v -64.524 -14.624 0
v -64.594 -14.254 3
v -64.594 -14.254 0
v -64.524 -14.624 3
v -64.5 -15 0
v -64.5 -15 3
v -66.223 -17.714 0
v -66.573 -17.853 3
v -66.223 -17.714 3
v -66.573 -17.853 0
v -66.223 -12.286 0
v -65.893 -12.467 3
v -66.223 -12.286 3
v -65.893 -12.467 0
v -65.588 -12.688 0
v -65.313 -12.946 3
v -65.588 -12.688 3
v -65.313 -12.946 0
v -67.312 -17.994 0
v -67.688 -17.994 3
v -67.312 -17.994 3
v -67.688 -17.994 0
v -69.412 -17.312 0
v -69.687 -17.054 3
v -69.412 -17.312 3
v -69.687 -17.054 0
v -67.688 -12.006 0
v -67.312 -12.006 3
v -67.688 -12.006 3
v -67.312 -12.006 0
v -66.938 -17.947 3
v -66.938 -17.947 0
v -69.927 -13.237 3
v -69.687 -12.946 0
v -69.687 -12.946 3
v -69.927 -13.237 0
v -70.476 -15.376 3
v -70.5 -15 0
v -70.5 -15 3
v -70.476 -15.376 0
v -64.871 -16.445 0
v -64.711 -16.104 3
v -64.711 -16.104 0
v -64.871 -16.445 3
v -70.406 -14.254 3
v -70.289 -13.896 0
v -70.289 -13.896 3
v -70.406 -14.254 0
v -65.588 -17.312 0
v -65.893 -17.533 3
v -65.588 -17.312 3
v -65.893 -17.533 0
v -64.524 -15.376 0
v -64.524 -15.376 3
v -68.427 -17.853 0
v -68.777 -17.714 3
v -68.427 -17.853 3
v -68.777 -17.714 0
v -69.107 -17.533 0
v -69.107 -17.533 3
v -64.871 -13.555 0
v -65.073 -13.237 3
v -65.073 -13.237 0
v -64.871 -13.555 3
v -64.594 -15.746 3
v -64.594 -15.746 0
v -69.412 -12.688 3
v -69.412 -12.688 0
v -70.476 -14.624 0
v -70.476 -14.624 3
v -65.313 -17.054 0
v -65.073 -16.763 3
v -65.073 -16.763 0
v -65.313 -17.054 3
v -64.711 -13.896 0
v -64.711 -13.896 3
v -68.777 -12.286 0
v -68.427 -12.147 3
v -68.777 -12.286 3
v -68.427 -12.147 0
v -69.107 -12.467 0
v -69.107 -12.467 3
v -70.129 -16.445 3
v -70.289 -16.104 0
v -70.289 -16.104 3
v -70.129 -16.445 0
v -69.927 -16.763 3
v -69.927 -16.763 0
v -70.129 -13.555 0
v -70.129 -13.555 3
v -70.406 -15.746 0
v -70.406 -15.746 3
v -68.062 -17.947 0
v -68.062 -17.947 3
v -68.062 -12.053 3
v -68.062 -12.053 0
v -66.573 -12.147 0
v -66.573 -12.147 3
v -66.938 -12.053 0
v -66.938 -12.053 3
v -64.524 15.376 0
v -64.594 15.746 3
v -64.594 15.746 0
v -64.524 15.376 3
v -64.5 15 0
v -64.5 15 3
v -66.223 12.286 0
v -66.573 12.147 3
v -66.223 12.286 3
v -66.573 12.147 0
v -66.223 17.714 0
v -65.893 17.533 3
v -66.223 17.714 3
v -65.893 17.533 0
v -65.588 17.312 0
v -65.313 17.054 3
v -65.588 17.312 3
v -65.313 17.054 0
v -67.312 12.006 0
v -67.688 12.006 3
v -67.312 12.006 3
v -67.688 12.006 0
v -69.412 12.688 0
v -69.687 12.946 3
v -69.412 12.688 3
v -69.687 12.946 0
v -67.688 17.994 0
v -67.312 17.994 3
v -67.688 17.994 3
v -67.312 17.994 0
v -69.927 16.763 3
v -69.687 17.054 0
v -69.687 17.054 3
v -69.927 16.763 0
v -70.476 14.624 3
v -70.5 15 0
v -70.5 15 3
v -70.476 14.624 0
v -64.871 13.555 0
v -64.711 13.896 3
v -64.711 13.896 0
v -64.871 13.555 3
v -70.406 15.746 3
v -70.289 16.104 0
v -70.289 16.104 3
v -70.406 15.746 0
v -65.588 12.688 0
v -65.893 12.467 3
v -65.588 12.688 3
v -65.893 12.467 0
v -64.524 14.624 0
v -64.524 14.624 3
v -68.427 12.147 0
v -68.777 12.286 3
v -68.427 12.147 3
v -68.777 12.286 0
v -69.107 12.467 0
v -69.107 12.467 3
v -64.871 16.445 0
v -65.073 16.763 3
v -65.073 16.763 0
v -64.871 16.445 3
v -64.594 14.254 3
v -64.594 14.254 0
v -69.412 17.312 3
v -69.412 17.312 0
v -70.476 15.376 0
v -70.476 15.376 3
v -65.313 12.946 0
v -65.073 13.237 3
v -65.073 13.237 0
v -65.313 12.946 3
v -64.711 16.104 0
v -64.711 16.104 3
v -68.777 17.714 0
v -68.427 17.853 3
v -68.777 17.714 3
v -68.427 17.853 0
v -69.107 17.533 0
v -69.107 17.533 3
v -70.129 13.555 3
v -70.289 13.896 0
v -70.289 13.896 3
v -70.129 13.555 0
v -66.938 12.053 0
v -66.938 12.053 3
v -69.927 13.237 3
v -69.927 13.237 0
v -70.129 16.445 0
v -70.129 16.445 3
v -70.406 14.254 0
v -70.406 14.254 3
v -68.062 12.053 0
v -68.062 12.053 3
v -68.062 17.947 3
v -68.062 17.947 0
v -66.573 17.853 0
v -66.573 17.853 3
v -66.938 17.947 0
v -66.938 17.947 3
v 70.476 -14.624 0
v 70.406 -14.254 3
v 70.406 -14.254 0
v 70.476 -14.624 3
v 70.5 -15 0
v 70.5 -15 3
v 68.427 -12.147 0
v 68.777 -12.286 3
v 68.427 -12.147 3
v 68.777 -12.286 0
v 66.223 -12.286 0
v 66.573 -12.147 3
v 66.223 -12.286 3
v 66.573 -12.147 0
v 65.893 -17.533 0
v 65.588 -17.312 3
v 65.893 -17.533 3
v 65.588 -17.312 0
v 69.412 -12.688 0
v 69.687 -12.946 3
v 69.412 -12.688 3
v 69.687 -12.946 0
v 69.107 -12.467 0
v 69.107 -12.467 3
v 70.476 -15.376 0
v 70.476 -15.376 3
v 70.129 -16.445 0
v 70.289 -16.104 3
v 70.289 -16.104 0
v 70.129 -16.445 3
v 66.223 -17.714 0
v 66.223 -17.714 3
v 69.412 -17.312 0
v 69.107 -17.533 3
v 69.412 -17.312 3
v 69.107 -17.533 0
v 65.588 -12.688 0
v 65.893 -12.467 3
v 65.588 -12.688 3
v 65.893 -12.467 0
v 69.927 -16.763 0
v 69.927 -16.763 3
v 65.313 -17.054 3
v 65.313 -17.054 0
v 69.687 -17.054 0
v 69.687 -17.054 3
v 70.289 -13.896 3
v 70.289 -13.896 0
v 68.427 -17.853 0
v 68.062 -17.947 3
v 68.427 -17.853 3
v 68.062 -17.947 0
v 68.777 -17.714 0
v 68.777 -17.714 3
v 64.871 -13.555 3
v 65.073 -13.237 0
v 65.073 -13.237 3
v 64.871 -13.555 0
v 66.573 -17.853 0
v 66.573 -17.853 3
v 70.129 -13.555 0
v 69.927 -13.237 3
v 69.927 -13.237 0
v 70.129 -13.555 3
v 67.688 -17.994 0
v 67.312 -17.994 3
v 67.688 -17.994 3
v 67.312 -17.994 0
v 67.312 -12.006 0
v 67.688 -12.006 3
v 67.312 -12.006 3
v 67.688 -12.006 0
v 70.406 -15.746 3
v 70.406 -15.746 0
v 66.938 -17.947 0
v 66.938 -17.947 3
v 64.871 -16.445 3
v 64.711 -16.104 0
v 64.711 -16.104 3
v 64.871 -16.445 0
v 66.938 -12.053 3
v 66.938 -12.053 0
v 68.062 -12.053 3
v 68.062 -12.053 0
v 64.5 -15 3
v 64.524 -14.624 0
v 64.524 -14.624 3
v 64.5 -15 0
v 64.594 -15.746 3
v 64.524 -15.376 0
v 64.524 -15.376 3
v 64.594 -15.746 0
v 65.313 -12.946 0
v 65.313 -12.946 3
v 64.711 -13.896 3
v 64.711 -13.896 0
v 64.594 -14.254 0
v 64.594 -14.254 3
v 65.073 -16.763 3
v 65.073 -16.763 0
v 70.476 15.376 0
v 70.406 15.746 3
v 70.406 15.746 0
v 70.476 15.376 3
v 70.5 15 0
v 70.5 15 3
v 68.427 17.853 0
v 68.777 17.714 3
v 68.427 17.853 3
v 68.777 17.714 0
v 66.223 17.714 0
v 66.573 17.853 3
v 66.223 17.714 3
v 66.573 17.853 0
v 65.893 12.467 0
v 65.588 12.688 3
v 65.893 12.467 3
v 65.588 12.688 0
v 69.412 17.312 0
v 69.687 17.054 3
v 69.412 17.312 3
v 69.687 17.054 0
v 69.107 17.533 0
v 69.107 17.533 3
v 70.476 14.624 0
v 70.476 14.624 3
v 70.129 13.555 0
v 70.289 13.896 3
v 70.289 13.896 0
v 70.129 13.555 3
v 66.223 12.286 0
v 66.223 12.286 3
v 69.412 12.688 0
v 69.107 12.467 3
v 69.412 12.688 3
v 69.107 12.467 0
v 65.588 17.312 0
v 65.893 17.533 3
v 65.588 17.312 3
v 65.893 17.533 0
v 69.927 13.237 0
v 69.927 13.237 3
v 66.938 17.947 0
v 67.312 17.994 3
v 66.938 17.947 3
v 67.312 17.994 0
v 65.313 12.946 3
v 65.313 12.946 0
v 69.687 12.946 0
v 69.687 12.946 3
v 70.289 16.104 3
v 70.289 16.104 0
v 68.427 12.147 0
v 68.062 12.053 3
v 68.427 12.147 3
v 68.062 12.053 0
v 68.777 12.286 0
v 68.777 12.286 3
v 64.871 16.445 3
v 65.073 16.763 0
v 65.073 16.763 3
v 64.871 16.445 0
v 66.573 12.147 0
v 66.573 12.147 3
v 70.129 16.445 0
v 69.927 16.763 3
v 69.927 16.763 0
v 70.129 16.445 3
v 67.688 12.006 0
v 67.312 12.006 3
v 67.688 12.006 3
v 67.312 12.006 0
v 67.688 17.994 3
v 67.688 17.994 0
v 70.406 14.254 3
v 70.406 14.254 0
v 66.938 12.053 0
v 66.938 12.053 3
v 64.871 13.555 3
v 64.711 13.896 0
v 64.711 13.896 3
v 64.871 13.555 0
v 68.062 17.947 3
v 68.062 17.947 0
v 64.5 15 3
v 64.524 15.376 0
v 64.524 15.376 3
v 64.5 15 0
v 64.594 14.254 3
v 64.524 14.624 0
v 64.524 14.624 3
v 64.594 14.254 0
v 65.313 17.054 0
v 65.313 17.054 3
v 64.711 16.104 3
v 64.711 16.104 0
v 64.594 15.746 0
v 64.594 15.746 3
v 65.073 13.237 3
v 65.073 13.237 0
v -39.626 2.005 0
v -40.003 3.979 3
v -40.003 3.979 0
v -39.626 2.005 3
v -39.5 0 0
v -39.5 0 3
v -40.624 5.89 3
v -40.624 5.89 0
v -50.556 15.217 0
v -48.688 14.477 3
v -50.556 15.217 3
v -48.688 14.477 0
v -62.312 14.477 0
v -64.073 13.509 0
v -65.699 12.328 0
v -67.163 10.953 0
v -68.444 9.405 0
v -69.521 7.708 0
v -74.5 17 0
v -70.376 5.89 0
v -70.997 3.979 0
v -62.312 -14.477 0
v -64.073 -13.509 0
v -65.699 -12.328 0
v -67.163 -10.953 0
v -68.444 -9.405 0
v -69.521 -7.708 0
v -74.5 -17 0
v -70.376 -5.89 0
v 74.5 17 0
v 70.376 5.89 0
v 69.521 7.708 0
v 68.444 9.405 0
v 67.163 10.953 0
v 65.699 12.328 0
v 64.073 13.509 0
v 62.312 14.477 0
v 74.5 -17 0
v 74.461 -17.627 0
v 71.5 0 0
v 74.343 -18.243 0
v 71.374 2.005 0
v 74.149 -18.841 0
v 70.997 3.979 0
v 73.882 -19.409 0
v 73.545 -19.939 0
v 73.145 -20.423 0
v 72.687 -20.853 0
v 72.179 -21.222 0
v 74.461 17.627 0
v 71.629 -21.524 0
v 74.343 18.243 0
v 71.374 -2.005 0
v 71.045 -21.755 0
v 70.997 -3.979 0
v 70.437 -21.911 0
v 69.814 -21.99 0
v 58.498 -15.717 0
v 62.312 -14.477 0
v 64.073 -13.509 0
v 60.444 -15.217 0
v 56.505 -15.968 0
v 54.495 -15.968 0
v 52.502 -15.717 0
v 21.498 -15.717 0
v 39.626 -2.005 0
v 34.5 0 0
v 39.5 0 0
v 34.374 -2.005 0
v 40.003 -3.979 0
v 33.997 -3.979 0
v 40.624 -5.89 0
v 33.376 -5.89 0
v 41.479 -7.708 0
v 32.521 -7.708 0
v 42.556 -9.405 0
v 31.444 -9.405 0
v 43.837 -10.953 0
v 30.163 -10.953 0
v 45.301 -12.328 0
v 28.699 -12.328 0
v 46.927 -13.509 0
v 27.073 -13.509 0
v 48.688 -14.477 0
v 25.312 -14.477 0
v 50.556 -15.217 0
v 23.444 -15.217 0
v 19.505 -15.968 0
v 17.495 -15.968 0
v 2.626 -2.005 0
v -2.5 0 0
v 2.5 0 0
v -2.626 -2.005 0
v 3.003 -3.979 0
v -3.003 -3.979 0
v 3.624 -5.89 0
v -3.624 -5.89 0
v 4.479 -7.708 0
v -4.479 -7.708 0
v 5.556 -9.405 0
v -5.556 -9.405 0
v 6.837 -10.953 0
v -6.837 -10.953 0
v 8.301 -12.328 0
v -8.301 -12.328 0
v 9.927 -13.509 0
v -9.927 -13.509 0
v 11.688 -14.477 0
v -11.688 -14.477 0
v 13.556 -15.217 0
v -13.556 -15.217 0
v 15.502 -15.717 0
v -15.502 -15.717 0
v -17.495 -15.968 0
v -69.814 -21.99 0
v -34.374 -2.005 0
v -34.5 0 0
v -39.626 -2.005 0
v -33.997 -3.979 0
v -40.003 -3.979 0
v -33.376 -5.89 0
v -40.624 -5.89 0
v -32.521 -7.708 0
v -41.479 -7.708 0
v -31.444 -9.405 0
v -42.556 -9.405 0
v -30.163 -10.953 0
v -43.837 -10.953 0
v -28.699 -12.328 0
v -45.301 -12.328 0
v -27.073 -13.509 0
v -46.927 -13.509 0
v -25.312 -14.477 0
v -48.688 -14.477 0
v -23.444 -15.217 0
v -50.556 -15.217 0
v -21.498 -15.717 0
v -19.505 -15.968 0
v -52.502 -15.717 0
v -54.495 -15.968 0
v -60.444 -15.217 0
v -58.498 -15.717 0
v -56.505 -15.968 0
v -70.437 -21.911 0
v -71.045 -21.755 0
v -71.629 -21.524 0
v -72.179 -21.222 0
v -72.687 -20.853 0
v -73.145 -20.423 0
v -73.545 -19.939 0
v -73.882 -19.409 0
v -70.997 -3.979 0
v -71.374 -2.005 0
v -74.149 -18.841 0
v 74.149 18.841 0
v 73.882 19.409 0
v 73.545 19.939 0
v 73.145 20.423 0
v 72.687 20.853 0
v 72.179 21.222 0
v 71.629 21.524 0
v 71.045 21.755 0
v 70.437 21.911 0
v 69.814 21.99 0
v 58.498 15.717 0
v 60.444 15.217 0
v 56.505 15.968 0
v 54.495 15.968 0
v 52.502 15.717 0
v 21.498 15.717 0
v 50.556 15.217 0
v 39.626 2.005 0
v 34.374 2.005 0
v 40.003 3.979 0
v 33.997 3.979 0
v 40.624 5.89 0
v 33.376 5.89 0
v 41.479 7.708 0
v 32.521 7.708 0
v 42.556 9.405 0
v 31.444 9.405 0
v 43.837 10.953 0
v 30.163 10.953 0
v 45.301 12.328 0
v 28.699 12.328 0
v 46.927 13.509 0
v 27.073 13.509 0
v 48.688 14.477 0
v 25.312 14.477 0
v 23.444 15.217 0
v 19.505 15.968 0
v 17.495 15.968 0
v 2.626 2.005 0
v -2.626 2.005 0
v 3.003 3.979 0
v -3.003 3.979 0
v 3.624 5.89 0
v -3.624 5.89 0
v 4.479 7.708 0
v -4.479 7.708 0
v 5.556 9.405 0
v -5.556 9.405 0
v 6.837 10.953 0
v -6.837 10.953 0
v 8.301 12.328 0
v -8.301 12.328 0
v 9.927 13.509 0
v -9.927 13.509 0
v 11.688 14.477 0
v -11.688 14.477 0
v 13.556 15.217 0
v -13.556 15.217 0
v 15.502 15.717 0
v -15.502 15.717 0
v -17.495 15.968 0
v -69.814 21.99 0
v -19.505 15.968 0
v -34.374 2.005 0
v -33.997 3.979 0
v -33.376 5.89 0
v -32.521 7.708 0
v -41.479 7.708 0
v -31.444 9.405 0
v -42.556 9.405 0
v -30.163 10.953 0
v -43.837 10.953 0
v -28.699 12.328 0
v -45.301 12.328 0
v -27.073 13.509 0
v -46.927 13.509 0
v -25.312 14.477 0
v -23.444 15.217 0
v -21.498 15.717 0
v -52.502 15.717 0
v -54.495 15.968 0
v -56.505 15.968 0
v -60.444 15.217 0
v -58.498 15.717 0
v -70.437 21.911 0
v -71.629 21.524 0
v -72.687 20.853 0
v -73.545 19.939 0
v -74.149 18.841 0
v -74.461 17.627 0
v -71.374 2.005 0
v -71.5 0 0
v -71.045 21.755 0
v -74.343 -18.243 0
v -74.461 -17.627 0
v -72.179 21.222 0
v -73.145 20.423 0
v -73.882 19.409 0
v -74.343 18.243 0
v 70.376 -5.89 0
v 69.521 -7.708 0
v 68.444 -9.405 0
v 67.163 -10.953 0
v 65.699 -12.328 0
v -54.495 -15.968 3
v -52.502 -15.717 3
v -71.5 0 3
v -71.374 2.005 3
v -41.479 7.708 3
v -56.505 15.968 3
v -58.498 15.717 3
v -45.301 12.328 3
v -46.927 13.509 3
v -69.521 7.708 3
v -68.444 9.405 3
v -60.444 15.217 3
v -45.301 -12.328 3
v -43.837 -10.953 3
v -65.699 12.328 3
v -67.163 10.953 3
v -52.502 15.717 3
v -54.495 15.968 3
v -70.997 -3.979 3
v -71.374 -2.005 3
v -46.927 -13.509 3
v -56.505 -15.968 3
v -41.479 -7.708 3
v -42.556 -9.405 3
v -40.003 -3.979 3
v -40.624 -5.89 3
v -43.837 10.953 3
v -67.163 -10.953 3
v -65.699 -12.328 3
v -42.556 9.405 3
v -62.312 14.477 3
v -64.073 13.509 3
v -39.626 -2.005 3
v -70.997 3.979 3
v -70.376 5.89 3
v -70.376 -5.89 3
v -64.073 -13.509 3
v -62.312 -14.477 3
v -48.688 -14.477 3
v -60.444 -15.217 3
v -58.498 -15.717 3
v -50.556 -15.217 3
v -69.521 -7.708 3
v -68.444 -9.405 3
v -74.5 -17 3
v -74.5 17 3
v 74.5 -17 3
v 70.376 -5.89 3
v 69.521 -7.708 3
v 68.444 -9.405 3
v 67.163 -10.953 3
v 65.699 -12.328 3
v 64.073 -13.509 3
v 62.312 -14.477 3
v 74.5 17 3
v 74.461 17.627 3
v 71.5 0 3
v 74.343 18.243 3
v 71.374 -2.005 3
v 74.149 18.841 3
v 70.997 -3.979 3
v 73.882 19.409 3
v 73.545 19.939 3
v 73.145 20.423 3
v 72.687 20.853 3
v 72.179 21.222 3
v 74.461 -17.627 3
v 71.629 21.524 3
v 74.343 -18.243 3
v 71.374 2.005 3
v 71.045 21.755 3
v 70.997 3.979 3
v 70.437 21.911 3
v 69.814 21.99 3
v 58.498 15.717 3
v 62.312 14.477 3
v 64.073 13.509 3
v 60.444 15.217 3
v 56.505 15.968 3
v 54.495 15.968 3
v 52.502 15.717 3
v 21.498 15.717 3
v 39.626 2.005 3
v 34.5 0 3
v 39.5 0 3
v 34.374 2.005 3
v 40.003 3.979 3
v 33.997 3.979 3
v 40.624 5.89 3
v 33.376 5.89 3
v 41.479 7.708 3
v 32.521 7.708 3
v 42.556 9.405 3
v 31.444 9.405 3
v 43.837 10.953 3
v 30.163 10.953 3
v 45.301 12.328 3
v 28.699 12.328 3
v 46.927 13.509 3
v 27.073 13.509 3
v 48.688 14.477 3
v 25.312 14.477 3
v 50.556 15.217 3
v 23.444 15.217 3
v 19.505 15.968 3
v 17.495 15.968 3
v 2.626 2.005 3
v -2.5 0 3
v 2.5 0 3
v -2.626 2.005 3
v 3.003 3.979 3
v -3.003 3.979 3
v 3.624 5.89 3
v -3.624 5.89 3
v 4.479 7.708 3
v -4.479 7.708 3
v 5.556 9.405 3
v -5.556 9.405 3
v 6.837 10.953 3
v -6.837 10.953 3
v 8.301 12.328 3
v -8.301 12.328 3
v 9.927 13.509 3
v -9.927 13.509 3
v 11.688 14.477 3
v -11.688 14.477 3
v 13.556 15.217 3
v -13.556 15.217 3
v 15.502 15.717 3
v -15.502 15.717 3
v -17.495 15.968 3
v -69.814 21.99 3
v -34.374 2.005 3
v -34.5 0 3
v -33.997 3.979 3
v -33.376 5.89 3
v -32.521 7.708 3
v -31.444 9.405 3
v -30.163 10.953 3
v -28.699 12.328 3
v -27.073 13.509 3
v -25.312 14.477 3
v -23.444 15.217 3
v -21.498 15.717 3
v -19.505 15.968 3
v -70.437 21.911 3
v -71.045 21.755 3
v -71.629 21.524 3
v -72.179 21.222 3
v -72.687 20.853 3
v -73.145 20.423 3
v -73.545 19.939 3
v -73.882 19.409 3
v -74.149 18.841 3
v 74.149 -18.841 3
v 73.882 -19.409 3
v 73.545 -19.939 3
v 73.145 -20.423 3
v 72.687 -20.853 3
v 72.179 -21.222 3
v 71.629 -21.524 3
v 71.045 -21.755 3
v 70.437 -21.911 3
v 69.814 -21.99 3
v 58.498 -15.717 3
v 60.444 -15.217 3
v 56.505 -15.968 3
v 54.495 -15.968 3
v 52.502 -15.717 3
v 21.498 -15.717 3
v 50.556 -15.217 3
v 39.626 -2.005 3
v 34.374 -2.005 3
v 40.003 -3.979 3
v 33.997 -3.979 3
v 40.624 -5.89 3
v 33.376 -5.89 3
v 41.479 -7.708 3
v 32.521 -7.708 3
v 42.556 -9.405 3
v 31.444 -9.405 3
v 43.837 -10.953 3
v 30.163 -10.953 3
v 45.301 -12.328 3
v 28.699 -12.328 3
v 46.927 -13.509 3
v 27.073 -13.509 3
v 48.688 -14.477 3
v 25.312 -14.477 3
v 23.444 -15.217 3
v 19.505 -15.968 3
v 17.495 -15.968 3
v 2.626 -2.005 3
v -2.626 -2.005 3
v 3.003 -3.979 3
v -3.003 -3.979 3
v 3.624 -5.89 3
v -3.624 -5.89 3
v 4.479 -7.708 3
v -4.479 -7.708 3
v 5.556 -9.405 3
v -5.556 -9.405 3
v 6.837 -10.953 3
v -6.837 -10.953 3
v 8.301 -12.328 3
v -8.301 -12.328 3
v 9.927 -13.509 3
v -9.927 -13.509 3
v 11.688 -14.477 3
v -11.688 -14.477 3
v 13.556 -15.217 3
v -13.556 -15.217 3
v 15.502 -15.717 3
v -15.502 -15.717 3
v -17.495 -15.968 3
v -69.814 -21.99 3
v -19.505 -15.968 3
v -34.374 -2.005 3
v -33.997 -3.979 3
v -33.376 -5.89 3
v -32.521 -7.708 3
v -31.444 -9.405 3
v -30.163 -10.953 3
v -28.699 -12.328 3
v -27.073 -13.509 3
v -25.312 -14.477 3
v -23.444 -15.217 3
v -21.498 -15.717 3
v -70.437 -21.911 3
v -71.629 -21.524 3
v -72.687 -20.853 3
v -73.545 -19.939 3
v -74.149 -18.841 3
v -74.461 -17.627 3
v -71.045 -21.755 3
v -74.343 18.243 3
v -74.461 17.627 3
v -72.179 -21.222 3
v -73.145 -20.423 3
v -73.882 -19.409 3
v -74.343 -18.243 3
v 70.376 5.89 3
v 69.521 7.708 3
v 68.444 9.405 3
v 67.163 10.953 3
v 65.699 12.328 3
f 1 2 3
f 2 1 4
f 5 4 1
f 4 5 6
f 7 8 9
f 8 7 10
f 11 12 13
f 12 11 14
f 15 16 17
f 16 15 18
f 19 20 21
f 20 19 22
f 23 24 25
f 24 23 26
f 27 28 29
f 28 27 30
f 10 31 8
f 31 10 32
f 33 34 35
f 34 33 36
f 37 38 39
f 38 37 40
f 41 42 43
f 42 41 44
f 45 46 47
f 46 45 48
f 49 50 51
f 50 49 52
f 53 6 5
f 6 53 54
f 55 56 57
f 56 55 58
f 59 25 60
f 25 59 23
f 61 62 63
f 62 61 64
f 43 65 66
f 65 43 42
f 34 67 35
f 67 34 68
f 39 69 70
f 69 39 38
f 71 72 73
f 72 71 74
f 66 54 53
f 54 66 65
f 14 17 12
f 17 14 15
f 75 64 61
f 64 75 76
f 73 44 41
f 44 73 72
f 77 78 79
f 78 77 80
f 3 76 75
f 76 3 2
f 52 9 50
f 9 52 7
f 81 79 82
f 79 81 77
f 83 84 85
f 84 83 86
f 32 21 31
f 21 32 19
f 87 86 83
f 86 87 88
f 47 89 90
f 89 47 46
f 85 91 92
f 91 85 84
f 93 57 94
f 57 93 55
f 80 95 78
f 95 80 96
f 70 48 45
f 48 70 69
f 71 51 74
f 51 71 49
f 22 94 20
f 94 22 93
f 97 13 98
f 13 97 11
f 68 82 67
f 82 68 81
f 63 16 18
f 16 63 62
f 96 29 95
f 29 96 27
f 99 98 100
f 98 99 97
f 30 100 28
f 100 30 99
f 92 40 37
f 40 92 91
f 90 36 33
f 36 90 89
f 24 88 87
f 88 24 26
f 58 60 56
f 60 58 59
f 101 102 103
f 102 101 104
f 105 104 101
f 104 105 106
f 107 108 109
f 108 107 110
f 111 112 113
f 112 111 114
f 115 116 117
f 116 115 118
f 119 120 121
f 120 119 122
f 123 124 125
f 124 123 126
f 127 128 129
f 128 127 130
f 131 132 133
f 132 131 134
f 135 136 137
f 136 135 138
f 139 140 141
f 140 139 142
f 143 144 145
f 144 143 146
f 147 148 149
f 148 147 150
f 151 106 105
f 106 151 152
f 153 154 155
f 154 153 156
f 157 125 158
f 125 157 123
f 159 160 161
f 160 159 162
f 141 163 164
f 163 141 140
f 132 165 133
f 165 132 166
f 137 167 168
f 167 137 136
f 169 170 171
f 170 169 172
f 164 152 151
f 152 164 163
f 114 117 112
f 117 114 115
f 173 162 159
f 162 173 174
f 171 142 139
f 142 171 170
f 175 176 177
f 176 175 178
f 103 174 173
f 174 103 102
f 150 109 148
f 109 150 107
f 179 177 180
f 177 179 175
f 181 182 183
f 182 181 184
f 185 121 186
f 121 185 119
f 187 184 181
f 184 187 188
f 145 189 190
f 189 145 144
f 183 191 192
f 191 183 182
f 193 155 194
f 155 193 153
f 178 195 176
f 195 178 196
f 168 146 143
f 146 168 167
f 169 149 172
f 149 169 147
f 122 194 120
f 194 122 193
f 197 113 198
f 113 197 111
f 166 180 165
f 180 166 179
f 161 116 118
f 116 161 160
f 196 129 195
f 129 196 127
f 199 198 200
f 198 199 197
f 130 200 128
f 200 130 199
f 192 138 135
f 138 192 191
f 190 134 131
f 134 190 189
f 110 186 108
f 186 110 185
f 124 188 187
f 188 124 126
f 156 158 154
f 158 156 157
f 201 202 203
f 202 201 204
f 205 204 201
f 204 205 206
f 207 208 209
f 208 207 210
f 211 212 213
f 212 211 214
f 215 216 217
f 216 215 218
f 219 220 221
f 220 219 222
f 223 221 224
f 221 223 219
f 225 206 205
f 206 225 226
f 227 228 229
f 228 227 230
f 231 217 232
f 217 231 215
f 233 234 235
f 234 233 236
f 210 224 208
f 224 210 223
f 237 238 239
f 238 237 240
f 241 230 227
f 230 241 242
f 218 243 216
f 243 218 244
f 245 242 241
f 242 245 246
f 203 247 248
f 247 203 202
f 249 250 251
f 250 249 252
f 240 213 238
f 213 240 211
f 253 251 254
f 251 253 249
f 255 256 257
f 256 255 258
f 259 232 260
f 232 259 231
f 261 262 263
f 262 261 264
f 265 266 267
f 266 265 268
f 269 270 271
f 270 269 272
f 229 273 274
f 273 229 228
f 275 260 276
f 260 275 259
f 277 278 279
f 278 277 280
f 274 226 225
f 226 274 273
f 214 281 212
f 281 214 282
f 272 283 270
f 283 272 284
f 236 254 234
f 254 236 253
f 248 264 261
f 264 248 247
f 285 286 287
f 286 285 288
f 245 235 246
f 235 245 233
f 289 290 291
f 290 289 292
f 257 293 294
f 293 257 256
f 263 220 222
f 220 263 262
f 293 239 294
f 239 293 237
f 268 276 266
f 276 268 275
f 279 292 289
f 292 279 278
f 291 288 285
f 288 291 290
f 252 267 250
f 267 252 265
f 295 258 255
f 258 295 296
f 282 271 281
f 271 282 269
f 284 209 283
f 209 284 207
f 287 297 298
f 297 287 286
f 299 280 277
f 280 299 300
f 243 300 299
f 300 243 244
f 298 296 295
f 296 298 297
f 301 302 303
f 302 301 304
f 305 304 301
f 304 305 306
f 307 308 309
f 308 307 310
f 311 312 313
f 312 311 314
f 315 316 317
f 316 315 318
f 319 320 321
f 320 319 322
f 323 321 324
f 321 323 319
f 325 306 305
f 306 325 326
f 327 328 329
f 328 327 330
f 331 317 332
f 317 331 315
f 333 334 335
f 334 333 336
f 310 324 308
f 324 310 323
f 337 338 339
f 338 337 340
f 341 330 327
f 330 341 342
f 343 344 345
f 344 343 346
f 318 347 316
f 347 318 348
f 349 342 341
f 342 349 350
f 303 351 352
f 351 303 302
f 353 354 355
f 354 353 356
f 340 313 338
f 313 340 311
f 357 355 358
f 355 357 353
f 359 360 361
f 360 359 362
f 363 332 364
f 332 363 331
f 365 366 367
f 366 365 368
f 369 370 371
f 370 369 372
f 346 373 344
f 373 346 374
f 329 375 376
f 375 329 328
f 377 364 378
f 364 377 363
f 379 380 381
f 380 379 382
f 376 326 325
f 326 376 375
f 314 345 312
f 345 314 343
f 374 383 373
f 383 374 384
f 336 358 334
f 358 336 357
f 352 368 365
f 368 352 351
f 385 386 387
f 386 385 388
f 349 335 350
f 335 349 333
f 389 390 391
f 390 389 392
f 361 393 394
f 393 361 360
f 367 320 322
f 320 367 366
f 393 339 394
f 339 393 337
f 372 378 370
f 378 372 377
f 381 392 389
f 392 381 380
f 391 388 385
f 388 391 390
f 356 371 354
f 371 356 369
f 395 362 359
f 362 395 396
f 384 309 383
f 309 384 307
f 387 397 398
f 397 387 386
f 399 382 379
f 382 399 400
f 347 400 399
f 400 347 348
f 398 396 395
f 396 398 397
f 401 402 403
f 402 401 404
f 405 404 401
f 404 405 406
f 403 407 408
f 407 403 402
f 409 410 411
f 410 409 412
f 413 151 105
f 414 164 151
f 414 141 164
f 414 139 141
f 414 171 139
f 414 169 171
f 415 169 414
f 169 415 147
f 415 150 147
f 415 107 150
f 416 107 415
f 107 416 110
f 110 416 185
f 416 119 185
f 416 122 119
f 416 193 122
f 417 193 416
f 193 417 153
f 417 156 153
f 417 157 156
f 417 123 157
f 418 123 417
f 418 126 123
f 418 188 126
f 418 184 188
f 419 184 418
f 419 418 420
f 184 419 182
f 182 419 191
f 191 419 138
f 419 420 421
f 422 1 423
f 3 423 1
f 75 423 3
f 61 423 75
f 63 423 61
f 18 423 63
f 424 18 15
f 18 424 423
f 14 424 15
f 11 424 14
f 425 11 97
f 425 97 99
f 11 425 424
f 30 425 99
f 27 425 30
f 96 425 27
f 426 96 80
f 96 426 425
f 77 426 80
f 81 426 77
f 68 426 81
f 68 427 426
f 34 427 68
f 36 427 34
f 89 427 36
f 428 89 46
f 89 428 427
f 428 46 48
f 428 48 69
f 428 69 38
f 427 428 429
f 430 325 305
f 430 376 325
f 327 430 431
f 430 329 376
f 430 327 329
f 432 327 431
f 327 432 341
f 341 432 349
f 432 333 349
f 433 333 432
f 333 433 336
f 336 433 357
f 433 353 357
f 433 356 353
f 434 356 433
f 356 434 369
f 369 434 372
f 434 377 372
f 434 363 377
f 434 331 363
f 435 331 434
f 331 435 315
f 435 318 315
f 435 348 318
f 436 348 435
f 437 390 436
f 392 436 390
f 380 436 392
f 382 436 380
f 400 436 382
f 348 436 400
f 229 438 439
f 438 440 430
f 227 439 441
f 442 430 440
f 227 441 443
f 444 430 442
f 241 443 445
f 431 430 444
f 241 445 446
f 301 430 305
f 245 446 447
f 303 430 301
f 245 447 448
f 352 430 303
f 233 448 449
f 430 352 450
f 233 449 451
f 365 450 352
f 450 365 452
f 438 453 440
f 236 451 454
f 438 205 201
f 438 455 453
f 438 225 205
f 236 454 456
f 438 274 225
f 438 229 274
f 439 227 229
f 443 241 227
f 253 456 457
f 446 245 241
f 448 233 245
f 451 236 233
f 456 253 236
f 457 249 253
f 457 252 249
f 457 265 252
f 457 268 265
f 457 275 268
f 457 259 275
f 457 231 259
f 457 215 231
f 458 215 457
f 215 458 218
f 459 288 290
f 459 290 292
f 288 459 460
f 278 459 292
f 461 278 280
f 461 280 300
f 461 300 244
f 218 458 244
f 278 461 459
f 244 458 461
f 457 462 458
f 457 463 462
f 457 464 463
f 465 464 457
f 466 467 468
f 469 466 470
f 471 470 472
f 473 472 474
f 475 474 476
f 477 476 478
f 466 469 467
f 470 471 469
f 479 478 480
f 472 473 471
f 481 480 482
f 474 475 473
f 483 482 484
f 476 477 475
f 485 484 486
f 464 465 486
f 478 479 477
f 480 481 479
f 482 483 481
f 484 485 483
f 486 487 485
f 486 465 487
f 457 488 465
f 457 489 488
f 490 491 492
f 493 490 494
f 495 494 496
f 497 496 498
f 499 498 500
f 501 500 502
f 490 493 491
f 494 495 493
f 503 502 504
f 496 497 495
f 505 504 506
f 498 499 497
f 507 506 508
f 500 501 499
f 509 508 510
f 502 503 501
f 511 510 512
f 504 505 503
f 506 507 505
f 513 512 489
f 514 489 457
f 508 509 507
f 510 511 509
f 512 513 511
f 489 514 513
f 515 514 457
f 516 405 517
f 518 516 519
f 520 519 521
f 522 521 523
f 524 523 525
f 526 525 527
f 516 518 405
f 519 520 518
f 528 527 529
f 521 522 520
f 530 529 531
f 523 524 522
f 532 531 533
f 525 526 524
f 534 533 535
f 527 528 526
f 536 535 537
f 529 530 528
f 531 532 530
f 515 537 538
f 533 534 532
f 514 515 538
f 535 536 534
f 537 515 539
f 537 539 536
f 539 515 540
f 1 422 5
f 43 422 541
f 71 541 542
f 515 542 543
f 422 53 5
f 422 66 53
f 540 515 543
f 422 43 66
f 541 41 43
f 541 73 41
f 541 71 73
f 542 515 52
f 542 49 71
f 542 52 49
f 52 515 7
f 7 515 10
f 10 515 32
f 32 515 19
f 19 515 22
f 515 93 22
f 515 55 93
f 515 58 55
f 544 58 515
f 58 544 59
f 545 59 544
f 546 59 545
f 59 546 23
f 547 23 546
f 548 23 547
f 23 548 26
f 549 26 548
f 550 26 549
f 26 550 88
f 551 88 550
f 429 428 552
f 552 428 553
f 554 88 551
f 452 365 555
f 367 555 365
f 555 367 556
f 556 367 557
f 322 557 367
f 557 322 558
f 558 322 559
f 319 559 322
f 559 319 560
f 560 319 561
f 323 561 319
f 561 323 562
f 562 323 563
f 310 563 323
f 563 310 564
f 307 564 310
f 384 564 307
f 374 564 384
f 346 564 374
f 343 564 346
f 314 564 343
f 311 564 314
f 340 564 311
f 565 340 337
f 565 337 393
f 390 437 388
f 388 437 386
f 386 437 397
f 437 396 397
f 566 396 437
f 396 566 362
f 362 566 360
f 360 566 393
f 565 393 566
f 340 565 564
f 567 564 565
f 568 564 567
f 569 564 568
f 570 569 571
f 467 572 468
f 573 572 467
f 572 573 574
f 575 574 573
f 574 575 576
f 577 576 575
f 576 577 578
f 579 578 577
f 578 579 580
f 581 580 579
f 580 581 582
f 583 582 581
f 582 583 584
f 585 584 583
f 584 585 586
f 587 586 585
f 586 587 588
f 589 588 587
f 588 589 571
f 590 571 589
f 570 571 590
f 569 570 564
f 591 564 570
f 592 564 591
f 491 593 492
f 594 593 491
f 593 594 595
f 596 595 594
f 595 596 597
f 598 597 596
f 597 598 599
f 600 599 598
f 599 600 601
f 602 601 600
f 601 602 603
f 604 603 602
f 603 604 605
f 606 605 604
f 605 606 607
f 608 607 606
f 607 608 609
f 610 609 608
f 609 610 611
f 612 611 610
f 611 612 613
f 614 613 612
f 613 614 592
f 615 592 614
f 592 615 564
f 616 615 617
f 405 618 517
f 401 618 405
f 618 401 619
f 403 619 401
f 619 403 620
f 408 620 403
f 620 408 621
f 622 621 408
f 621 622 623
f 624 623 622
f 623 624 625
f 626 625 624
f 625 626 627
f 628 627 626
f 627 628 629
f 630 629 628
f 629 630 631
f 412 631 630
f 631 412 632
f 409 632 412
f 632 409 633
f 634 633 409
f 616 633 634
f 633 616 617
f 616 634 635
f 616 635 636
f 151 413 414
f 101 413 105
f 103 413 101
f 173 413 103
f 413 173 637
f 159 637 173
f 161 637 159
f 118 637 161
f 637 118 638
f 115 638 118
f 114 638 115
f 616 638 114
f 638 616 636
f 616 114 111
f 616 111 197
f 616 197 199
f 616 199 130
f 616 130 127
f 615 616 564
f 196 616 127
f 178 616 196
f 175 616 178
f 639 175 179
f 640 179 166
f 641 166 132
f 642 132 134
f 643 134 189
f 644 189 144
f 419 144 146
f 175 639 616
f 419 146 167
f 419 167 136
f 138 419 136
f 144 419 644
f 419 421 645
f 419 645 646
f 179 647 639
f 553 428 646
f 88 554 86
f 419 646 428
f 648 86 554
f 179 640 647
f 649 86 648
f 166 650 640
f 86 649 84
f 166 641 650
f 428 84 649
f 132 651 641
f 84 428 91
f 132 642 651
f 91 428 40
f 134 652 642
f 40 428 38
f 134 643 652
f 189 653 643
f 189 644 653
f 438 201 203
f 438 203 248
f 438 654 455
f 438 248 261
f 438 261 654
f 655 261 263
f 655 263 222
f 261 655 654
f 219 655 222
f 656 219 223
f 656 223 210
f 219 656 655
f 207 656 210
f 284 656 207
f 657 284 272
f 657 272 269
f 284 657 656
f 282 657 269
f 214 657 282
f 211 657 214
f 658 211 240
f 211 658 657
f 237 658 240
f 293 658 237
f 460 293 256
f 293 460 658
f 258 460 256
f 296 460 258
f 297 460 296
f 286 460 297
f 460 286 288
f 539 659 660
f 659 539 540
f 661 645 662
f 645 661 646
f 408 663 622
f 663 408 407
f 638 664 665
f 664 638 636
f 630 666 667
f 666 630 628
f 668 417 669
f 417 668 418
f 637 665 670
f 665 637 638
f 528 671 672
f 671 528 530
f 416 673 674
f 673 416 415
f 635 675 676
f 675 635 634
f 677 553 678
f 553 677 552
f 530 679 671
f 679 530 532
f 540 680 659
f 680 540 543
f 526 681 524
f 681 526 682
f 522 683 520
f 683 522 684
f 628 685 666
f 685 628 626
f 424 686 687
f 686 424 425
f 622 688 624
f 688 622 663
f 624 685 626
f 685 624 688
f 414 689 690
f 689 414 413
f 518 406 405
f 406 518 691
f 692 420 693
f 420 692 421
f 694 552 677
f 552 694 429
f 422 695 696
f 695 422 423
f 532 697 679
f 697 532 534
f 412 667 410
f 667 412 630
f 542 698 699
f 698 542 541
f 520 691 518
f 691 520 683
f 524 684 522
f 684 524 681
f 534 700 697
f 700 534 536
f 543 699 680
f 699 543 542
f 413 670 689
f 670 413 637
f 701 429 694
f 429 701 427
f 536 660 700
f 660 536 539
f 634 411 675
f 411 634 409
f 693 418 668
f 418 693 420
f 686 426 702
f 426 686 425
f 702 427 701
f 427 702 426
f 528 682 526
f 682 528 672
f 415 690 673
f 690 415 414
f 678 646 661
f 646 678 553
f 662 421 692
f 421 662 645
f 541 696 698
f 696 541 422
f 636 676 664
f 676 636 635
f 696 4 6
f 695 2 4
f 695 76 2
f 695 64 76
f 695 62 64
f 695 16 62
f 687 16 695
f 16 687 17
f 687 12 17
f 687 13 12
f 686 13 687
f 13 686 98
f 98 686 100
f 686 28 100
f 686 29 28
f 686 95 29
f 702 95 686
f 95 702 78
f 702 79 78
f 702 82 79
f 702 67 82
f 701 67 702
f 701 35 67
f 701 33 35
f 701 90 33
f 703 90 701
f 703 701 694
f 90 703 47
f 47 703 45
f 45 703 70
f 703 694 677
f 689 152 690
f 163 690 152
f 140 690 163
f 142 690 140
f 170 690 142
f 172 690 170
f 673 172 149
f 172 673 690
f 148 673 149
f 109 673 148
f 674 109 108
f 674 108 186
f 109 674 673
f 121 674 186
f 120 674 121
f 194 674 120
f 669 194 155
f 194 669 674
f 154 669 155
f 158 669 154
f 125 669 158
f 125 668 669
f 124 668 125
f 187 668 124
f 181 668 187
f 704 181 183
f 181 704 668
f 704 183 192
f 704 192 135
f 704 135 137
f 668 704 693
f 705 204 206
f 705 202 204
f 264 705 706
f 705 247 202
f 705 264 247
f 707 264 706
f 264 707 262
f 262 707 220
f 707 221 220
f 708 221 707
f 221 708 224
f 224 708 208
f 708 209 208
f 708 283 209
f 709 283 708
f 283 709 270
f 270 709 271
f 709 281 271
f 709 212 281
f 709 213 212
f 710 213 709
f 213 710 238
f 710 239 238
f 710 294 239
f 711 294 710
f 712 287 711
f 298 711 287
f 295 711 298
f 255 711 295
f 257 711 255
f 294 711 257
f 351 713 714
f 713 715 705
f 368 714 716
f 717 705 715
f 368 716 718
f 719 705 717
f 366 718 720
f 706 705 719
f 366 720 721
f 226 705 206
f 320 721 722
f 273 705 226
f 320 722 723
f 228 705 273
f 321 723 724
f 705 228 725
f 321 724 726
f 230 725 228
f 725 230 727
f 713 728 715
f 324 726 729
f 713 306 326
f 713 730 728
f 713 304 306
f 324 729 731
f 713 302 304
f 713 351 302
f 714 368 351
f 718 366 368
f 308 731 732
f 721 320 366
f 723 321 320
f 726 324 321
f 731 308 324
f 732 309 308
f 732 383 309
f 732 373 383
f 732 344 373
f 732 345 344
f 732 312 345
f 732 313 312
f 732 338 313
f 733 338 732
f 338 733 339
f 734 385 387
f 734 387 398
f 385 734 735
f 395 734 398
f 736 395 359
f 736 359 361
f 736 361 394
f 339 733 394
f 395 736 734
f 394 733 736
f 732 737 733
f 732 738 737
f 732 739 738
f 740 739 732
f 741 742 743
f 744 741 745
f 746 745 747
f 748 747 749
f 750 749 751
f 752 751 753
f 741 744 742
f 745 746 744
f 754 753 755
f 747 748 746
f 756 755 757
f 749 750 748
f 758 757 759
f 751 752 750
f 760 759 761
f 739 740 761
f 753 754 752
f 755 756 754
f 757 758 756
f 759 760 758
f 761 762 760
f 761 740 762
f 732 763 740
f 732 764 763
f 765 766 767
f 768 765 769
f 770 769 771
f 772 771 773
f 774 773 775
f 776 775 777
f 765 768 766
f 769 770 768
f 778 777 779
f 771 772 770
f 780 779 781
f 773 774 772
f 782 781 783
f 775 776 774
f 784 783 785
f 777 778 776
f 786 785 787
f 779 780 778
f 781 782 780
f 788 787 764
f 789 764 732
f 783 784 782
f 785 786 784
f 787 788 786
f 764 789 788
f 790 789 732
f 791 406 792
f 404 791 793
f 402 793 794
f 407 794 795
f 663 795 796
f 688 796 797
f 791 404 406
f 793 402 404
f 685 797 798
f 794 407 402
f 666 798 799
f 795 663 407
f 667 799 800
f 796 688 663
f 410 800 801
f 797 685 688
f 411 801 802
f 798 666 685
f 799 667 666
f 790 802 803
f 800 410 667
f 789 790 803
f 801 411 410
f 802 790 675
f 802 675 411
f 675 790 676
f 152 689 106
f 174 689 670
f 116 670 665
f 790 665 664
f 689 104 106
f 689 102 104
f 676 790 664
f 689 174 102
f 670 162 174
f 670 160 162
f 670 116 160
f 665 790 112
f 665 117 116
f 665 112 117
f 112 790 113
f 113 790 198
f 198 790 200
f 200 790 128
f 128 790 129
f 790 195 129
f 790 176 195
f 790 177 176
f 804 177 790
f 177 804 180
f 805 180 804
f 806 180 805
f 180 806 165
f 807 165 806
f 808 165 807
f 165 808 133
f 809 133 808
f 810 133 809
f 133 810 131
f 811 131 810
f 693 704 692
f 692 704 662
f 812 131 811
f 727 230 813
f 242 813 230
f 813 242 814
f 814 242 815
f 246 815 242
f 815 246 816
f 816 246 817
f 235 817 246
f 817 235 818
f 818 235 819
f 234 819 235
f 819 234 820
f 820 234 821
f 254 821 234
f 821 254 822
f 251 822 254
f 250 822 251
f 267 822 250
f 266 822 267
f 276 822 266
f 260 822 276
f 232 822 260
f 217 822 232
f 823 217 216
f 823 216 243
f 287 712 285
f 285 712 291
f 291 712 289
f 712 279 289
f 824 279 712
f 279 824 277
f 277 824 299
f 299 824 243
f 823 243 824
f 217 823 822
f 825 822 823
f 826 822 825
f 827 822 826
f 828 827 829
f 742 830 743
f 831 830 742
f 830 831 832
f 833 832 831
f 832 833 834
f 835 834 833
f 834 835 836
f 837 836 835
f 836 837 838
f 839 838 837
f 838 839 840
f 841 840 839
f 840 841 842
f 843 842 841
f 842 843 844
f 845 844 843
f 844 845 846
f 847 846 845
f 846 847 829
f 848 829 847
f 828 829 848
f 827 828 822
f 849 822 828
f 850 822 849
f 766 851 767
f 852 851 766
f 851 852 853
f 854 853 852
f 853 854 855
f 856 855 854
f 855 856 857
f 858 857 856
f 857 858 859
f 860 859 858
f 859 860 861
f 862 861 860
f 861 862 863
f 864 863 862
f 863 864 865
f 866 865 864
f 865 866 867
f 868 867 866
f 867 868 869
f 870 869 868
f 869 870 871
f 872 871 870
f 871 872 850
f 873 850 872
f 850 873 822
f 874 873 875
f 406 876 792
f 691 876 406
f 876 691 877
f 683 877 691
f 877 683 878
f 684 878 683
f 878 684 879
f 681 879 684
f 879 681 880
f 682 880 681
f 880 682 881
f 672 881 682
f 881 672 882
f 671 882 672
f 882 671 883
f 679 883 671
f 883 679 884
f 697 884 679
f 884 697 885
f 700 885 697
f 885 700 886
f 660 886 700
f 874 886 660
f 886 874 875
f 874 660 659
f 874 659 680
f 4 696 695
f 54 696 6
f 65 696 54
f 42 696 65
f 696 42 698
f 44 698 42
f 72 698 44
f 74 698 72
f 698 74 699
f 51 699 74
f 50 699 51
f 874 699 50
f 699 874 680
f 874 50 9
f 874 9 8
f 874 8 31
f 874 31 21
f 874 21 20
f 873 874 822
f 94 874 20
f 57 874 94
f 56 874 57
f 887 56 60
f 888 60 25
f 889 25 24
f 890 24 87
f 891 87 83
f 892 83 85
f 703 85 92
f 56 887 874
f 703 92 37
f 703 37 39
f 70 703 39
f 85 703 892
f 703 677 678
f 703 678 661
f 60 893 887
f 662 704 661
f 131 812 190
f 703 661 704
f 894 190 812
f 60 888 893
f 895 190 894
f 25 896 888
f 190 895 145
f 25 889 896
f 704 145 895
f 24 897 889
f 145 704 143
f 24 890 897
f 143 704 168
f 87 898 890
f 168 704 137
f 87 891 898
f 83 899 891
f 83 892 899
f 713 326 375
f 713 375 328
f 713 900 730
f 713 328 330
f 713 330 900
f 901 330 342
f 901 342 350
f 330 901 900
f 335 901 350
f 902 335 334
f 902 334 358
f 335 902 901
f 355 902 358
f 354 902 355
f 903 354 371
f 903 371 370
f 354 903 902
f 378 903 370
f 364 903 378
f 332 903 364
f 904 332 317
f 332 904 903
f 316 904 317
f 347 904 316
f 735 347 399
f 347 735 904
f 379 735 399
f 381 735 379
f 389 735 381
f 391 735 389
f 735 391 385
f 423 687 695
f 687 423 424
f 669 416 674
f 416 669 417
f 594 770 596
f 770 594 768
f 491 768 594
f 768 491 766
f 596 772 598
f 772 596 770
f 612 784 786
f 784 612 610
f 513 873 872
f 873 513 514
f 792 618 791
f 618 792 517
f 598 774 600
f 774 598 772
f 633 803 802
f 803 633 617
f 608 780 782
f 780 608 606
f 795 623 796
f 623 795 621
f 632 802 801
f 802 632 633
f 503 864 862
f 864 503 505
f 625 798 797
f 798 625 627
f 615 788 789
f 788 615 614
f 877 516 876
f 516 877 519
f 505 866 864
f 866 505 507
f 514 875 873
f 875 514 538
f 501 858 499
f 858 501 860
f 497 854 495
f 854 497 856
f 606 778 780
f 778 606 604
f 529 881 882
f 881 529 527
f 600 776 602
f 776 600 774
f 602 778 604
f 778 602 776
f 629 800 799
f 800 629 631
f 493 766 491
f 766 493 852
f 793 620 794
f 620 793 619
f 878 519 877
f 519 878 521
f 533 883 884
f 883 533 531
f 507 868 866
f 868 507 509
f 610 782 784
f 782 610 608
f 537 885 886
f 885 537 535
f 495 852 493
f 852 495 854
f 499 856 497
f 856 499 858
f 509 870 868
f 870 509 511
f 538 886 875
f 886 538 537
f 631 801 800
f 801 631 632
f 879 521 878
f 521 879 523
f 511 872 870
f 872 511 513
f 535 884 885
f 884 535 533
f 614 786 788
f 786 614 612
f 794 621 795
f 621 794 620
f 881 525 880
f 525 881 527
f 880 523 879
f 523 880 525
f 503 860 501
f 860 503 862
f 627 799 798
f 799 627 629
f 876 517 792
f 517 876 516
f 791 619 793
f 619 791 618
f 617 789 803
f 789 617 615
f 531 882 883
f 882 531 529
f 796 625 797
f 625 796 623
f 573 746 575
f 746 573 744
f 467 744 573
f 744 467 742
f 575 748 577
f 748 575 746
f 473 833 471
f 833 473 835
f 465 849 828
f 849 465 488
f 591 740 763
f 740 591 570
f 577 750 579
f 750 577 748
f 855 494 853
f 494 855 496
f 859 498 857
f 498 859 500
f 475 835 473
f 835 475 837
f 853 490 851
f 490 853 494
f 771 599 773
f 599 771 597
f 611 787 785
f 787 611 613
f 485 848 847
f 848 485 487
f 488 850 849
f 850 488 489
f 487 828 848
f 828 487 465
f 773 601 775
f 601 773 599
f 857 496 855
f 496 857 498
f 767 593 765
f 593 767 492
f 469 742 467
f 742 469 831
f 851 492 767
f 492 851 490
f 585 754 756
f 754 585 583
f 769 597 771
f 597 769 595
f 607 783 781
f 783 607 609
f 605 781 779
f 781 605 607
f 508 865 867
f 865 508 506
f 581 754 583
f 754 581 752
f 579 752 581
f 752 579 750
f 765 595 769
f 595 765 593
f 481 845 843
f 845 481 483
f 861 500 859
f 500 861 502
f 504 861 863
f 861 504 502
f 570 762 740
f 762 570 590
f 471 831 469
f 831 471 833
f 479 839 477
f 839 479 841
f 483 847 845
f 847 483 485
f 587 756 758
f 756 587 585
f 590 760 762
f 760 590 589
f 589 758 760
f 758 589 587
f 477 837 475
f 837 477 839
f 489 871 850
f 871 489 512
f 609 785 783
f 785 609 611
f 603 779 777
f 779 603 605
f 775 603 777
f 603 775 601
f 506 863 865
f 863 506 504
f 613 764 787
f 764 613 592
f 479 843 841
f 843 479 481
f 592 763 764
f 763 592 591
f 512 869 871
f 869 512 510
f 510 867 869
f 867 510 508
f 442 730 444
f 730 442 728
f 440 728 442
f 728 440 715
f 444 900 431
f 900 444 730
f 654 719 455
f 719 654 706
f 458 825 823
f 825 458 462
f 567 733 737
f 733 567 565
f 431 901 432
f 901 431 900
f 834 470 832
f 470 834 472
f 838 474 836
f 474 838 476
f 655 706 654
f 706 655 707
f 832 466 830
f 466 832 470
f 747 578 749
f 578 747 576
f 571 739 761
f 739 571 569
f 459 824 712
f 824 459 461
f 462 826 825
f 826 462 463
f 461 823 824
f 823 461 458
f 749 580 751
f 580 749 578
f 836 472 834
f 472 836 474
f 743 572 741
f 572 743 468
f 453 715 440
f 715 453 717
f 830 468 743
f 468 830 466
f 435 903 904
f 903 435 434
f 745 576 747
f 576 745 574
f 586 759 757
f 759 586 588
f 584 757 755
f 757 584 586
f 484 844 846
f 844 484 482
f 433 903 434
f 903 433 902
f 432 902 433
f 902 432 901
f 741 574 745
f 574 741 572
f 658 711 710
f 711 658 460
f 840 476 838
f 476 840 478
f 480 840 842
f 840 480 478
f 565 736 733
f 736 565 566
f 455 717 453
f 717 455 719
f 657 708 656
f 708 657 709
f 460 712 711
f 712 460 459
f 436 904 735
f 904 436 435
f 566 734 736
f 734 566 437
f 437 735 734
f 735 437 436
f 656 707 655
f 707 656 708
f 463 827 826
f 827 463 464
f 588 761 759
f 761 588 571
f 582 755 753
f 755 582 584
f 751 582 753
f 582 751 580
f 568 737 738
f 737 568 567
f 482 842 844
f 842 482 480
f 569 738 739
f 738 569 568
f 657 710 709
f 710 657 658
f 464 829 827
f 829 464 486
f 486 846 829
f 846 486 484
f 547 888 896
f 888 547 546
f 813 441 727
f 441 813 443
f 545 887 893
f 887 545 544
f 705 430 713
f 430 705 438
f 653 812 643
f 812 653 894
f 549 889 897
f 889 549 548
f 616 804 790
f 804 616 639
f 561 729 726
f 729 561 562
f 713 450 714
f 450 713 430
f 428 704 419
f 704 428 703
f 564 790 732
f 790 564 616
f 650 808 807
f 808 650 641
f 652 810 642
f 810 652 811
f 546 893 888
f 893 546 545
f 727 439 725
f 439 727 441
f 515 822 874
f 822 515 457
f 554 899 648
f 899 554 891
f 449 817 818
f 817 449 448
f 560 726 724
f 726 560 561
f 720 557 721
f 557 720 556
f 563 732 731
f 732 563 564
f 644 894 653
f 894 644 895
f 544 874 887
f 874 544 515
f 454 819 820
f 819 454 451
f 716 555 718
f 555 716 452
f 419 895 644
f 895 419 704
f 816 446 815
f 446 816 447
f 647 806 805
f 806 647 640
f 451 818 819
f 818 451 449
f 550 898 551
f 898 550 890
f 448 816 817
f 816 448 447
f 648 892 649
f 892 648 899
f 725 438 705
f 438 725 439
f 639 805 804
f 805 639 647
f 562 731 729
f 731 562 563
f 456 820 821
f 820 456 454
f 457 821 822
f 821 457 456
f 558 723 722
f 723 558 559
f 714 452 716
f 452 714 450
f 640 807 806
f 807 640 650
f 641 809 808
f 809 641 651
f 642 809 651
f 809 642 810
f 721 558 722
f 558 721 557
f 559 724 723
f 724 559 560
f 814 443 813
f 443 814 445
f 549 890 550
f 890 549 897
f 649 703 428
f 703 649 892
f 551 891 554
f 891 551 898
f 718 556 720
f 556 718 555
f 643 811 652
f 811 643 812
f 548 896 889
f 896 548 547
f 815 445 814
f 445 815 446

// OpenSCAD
$fn = 50;


difference() {
	union() {
		hull() {
			translate(v = [-69.5000000000, 17.0000000000, 0]) {
				cylinder(h = 3, r = 5);
			}
			translate(v = [69.5000000000, 17.0000000000, 0]) {
				cylinder(h = 3, r = 5);
			}
			translate(v = [-69.5000000000, -17.0000000000, 0]) {
				cylinder(h = 3, r = 5);
			}
			translate(v = [69.5000000000, -17.0000000000, 0]) {
				cylinder(h = 3, r = 5);
			}
		}
	}
	union() {
		#translate(v = [-67.5000000000, -15.0000000000, -100.0000000000]) {
			cylinder(h = 200, r = 3.0000000000);
		}
		#translate(v = [-67.5000000000, 15.0000000000, -100.0000000000]) {
			cylinder(h = 200, r = 3.0000000000);
		}
		#translate(v = [67.5000000000, -15.0000000000, -100.0000000000]) {
			cylinder(h = 200, r = 3.0000000000);
		}
		#translate(v = [67.5000000000, 15.0000000000, -100.0000000000]) {
			cylinder(h = 200, r = 3.0000000000);
		}
		#translate(v = [-55.5000000000, 0, 0]) {
			cylinder(h = 3, r = 16.0000000000);
		}
		#translate(v = [-18.5000000000, 0, 0]) {
			cylinder(h = 3, r = 16.0000000000);
		}
		#translate(v = [18.5000000000, 0, 0]) {
			cylinder(h = 3, r = 16.0000000000);
		}
		#translate(v = [55.5000000000, 0, 0]) {
			cylinder(h = 3, r = 16.0000000000);
		}
	}
}
